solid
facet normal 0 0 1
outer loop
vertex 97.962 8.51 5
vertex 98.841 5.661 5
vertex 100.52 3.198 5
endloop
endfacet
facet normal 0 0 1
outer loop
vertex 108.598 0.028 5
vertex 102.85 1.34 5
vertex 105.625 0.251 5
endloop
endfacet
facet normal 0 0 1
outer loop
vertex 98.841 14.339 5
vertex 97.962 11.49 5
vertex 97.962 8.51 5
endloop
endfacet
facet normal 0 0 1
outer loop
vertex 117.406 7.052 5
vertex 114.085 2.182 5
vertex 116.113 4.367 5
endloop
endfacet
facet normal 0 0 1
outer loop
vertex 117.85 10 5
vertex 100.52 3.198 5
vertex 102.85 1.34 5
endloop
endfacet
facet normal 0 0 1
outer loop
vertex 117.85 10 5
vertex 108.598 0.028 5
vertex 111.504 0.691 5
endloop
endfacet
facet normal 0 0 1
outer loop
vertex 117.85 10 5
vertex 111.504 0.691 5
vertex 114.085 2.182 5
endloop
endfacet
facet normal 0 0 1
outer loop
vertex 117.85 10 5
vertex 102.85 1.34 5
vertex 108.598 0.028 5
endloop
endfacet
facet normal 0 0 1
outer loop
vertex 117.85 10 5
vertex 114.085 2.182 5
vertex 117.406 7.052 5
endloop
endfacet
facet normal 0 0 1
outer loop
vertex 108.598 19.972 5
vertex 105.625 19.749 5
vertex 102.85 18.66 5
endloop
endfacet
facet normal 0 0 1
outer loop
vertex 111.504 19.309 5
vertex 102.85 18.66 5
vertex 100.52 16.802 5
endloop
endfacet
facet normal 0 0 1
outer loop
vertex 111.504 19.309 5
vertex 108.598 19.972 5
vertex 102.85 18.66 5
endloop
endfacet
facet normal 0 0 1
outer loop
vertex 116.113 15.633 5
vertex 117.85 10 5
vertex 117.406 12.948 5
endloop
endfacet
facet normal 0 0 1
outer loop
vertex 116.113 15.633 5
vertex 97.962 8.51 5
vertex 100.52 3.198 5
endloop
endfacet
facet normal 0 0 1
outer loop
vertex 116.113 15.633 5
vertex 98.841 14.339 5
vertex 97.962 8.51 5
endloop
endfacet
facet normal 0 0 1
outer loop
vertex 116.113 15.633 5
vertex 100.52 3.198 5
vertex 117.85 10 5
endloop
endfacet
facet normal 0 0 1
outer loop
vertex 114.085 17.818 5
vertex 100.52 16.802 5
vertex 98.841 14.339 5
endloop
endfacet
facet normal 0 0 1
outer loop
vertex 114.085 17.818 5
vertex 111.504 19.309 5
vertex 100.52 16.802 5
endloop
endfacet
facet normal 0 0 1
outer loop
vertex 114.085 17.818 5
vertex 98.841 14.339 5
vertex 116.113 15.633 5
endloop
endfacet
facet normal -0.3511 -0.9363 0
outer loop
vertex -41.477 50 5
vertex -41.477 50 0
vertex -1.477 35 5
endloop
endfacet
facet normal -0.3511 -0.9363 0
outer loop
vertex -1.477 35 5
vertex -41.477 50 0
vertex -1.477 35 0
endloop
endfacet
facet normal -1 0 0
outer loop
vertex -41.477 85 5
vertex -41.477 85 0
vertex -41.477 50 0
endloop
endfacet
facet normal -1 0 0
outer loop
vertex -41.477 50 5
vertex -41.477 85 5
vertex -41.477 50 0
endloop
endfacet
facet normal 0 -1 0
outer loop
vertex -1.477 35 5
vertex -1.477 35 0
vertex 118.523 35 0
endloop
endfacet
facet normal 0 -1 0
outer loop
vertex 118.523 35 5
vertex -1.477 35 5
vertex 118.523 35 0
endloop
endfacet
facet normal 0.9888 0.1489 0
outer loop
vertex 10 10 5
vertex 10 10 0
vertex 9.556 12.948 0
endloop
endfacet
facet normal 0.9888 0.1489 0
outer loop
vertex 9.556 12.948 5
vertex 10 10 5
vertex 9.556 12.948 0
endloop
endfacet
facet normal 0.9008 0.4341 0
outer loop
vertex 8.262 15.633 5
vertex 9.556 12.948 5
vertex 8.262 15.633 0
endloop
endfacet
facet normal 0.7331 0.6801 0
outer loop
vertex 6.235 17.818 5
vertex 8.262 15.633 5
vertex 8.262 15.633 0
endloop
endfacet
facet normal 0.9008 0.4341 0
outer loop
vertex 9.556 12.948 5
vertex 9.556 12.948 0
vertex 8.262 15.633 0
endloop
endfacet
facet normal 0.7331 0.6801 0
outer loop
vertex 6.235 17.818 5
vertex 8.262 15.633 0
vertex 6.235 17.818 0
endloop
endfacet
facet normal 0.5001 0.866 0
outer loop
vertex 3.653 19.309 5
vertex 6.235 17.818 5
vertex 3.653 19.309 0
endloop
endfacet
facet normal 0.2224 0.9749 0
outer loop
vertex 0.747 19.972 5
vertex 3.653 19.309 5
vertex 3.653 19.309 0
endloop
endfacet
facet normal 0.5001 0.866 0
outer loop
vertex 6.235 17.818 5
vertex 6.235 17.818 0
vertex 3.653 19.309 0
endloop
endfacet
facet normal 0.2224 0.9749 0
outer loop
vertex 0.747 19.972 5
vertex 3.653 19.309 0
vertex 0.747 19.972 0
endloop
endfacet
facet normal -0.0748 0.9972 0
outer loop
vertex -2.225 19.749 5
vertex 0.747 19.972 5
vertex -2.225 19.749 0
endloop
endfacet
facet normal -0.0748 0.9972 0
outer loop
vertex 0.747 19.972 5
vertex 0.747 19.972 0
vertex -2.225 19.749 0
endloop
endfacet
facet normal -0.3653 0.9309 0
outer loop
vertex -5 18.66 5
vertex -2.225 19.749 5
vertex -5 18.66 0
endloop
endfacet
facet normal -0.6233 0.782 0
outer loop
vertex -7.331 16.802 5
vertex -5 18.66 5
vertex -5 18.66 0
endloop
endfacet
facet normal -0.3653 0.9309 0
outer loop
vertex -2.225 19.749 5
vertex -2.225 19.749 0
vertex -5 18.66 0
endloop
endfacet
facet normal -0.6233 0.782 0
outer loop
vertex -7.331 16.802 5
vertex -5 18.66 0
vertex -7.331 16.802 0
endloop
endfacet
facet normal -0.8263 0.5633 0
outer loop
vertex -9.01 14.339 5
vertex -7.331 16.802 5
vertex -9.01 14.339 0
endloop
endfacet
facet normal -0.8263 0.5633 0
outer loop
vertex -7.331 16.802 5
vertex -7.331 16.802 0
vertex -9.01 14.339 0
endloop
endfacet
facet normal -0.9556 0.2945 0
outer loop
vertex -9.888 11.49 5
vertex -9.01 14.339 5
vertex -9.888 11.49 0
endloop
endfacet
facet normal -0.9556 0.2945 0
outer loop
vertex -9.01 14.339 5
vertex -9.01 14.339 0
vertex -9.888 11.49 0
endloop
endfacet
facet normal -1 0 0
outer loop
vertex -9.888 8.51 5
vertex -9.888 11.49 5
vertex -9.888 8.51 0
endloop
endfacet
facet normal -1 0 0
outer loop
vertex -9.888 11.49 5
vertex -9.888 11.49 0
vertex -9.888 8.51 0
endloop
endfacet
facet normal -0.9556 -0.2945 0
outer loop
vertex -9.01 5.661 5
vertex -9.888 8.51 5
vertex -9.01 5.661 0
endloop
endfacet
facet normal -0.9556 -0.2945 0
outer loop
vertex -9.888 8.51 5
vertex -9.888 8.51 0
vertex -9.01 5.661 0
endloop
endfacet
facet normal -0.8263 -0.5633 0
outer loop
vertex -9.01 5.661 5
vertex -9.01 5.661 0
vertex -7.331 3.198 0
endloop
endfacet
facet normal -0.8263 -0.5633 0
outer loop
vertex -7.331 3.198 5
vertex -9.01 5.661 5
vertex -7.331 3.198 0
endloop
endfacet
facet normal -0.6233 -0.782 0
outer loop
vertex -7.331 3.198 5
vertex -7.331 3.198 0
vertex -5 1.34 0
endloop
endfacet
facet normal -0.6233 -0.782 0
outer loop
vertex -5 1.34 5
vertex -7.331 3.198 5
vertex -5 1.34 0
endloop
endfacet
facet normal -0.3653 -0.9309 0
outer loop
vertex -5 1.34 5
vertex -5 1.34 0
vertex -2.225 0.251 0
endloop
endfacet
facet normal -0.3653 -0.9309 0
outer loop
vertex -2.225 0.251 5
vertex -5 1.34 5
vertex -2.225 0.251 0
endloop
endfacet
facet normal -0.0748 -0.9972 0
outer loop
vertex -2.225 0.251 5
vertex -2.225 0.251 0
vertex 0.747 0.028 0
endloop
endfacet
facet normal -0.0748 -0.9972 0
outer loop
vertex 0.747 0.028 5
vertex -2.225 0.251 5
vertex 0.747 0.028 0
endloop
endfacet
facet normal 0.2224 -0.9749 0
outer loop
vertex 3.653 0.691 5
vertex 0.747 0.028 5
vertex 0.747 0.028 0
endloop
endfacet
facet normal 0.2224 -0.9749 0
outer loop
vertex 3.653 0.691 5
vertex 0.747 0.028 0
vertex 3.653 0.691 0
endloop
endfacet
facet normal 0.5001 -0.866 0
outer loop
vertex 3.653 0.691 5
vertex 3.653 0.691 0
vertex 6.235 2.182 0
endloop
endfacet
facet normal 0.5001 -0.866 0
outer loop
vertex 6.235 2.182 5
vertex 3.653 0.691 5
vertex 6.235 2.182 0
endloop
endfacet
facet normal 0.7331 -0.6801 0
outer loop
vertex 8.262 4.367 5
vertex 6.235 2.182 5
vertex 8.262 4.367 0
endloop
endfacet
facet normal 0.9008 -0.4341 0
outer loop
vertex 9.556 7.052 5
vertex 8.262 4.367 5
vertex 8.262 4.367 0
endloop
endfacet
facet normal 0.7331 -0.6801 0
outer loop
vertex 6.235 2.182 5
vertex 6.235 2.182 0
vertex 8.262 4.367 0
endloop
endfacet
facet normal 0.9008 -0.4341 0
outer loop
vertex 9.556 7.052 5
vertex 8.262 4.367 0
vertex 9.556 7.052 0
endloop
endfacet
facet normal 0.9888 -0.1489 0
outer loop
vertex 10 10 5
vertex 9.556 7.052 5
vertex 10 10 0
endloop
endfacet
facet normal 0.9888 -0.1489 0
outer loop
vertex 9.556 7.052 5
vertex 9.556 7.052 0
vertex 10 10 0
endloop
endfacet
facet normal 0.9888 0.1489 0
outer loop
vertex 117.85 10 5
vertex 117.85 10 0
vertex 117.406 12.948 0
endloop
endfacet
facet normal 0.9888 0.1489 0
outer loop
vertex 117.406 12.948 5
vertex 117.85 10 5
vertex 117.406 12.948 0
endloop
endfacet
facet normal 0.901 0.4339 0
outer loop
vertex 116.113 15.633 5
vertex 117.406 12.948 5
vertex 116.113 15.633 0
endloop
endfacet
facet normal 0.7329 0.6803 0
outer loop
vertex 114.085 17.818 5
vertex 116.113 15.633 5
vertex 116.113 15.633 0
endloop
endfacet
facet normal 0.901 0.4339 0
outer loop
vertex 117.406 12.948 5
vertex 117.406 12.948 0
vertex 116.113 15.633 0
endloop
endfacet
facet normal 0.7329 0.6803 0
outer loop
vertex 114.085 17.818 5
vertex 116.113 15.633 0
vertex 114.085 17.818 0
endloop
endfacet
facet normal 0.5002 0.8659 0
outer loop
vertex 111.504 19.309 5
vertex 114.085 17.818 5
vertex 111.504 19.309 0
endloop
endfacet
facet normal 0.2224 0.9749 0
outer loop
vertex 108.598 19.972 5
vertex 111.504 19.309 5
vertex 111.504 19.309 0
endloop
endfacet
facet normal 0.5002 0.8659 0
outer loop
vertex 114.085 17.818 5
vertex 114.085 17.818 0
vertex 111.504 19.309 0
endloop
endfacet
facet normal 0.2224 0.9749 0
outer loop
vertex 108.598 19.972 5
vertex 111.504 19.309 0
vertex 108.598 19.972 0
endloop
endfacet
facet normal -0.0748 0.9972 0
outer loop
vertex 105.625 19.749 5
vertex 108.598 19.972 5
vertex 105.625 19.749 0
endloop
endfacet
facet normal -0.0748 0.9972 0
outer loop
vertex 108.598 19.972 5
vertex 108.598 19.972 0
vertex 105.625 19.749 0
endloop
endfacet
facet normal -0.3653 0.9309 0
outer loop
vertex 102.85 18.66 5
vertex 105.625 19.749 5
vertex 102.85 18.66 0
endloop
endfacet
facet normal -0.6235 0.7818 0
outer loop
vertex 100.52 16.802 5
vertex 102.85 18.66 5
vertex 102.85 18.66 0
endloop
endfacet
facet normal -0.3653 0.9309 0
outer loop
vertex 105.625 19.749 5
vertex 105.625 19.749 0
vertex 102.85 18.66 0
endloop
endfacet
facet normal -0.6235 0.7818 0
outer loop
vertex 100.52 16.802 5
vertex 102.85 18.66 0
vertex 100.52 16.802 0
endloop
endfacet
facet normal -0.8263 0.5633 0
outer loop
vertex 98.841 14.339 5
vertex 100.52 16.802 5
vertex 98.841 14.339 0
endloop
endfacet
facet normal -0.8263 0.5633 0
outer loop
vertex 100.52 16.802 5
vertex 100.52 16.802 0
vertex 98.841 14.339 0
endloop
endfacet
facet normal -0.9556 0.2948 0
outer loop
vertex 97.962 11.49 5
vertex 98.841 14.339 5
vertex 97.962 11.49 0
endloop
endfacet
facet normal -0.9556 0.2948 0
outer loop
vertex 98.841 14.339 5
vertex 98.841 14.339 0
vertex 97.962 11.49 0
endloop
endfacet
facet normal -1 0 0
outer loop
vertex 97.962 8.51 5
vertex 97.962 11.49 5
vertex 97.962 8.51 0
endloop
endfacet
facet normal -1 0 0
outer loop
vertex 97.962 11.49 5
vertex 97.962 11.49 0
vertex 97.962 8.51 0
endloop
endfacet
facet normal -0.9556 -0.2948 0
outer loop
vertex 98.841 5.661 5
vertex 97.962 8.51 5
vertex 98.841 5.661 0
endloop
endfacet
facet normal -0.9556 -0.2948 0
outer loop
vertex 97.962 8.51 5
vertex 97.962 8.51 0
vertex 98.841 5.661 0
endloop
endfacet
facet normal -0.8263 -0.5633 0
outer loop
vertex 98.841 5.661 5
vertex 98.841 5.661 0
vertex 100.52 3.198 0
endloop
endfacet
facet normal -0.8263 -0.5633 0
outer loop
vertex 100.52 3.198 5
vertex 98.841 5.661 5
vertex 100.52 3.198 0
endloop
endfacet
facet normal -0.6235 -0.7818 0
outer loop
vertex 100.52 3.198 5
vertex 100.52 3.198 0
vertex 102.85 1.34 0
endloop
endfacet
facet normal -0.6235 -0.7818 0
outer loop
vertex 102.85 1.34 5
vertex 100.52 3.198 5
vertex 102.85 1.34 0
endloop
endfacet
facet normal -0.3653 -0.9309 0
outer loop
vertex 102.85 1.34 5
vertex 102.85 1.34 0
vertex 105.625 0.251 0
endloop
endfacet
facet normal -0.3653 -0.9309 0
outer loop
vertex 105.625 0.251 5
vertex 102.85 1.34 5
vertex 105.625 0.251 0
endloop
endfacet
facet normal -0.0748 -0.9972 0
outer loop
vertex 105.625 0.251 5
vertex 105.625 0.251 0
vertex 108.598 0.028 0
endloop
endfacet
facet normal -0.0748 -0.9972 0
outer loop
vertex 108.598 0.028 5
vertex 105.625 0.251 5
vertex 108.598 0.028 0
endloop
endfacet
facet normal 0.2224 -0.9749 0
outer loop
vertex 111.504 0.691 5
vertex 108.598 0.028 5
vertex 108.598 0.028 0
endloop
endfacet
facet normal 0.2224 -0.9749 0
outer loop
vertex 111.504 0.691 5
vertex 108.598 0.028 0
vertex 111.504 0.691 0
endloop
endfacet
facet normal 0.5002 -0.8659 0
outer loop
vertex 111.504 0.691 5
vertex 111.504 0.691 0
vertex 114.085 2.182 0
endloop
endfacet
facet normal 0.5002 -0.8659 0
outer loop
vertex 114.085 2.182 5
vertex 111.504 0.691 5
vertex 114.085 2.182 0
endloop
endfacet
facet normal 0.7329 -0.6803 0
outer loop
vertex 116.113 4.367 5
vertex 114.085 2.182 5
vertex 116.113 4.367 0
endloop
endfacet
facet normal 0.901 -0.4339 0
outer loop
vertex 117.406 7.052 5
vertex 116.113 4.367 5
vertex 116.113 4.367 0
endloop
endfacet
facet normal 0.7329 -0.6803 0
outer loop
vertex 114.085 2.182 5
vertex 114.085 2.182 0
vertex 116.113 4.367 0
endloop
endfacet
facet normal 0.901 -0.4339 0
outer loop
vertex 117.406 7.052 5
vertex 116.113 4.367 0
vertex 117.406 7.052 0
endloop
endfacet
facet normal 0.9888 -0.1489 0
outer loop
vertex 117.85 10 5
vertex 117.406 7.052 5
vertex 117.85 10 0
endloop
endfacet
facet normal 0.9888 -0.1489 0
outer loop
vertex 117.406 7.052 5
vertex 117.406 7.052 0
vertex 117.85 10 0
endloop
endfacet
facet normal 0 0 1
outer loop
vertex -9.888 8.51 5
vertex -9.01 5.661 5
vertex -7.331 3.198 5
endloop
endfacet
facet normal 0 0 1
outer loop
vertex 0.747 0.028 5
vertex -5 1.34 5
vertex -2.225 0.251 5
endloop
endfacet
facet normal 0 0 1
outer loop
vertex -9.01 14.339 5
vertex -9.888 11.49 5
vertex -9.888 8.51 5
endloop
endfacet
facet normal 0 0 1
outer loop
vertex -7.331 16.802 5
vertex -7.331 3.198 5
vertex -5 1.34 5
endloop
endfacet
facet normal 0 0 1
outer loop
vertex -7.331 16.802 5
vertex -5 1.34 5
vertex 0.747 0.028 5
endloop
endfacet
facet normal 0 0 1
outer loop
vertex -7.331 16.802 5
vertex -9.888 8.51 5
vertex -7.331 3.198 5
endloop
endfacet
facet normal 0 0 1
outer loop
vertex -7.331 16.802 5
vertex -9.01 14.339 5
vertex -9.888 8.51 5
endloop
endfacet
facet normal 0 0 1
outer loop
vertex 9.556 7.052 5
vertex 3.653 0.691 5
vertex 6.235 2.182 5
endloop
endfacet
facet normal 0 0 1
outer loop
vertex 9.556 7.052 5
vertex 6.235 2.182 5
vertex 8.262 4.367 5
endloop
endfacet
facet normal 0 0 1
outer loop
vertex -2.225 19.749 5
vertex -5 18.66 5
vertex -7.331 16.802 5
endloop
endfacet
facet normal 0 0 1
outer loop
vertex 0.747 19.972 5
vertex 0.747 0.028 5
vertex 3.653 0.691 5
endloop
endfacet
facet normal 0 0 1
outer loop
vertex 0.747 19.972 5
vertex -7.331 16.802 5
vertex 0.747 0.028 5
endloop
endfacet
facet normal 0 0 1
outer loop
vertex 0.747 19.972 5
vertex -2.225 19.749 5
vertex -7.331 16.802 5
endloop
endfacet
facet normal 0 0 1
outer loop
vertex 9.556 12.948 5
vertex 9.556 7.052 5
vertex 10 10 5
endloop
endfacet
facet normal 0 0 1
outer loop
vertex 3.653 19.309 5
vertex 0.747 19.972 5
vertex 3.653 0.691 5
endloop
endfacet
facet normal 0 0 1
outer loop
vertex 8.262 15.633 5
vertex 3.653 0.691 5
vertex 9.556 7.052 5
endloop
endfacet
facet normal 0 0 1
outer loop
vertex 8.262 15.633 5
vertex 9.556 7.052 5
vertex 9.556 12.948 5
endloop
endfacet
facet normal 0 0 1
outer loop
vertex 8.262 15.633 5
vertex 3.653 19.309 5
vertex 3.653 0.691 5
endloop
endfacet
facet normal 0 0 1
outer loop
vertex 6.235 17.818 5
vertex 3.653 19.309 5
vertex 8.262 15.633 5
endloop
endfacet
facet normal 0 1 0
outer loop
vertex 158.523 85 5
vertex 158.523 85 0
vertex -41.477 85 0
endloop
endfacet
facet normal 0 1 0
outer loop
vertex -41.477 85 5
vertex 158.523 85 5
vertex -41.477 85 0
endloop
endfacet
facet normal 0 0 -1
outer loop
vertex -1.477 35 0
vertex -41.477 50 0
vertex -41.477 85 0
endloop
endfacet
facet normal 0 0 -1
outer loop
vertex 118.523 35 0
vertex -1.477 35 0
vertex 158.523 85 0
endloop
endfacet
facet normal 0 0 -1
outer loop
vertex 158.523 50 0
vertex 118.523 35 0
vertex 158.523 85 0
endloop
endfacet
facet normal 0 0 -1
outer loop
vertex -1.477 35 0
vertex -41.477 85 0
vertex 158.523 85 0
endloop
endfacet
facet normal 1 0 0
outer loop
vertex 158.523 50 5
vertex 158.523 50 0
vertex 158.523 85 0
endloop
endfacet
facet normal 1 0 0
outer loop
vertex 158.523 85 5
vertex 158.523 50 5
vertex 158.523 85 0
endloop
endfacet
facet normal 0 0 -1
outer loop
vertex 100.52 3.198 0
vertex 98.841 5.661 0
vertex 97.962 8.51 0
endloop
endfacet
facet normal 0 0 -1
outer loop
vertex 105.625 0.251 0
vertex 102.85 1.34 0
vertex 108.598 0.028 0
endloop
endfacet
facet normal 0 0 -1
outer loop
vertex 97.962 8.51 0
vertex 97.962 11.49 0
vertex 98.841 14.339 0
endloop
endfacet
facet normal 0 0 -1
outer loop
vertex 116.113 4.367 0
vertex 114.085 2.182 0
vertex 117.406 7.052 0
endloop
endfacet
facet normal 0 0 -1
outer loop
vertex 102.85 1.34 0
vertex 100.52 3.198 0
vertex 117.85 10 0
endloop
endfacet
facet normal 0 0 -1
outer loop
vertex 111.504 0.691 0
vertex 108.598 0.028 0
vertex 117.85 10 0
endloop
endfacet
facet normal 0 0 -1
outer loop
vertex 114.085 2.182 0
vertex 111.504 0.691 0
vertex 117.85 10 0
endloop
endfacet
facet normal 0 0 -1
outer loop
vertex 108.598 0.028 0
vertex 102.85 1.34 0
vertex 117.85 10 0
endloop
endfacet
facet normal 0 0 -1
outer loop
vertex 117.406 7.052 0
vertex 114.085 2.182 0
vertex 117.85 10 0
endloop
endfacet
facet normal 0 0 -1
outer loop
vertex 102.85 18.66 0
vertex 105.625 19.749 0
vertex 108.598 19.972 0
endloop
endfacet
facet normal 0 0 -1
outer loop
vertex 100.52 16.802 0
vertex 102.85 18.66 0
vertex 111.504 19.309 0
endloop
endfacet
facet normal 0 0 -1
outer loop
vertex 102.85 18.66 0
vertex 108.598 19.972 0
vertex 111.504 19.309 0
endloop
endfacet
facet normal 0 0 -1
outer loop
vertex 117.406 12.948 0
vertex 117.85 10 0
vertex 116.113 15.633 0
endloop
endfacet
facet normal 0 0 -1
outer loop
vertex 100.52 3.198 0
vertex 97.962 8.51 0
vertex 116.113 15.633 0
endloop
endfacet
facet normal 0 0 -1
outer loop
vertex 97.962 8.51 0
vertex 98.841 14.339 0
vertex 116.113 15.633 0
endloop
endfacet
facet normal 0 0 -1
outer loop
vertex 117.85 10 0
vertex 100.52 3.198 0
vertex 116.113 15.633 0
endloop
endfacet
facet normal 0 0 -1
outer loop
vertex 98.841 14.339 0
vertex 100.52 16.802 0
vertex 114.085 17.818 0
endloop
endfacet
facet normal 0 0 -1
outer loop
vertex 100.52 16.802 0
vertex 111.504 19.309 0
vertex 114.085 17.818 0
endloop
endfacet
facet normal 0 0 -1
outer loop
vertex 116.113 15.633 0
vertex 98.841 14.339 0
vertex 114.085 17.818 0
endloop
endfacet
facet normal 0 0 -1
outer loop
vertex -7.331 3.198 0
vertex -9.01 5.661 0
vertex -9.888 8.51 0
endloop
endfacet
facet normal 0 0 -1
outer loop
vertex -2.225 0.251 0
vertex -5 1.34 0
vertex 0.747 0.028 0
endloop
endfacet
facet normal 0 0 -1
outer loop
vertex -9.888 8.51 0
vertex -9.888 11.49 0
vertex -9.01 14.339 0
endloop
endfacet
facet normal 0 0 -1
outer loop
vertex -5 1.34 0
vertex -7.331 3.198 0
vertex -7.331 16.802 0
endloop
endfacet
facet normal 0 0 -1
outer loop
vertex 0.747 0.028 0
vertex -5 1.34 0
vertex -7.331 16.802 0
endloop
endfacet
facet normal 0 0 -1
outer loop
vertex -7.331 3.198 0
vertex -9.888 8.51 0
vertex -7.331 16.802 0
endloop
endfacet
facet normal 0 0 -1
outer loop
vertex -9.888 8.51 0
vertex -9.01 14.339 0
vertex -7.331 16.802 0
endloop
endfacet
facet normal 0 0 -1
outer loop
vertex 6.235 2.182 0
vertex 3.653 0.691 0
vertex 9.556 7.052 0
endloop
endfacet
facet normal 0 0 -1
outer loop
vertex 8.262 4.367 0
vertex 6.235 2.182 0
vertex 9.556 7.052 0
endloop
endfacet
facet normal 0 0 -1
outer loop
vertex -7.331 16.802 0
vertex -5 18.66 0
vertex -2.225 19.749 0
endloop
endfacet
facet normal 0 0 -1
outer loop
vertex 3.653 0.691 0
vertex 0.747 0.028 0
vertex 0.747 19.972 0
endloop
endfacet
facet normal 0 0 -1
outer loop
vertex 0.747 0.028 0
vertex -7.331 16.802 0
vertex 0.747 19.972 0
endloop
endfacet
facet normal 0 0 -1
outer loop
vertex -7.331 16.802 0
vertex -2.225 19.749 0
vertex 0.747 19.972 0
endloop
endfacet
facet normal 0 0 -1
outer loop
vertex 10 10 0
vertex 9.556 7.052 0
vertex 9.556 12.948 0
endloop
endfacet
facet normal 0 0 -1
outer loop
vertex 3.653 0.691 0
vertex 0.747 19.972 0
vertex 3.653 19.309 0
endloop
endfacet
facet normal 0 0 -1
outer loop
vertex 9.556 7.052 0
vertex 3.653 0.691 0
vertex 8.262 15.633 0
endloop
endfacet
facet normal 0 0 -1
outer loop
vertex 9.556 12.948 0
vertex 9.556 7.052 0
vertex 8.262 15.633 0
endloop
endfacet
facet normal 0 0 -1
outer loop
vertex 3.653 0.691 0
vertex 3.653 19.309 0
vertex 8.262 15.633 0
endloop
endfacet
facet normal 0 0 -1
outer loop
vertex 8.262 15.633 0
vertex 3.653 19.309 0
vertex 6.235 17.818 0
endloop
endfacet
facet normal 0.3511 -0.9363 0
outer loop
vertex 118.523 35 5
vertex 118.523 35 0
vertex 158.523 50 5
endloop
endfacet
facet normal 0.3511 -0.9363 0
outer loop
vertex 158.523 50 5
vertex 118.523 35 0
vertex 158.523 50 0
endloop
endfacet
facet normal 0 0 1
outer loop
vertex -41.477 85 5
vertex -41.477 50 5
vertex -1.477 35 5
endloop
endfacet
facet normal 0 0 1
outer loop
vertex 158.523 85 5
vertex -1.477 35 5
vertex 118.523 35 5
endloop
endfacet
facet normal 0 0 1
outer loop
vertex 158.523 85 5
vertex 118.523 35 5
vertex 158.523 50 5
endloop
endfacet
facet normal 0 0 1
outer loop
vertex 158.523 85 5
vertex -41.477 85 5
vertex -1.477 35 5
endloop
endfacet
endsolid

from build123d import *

# Parameters (mm, degrees)
SKETCH1_R             = 10
BOSS_EXTRUDE1_DEPTH   = 5
BOSS_EXTRUDE1_2_DEPTH = 5
BOSS_EXTRUDE1_3_DEPTH = 5


with BuildPart() as part:
    # Sketch1 → Boss-Extrude1 (new body)
    with BuildSketch(Plane.XY):
        with Locations((0, 10)):
            Circle(SKETCH1_R)
    extrude(amount=BOSS_EXTRUDE1_DEPTH)


with BuildPart() as body_2:
    # Sketch1 → Boss-Extrude1 2 (new body)
    with BuildSketch(Plane.XY):
        with Locations((107.850406647, 10)):
            Circle(SKETCH1_R)
    extrude(amount=BOSS_EXTRUDE1_2_DEPTH)


with BuildPart() as body_3:
    # Sketch1 → Boss-Extrude1 3 (new body)
    with BuildSketch(Plane.XY):
        Polygon((158.522615343, 85), (-41.477384657, 85), (-41.477384657, 50), (-1.477384657, 35), (118.522615343, 35), (158.522615343, 50), align=None)
    extrude(amount=BOSS_EXTRUDE1_3_DEPTH)


solid = Compound([part.part, body_2.part, body_3.part])
